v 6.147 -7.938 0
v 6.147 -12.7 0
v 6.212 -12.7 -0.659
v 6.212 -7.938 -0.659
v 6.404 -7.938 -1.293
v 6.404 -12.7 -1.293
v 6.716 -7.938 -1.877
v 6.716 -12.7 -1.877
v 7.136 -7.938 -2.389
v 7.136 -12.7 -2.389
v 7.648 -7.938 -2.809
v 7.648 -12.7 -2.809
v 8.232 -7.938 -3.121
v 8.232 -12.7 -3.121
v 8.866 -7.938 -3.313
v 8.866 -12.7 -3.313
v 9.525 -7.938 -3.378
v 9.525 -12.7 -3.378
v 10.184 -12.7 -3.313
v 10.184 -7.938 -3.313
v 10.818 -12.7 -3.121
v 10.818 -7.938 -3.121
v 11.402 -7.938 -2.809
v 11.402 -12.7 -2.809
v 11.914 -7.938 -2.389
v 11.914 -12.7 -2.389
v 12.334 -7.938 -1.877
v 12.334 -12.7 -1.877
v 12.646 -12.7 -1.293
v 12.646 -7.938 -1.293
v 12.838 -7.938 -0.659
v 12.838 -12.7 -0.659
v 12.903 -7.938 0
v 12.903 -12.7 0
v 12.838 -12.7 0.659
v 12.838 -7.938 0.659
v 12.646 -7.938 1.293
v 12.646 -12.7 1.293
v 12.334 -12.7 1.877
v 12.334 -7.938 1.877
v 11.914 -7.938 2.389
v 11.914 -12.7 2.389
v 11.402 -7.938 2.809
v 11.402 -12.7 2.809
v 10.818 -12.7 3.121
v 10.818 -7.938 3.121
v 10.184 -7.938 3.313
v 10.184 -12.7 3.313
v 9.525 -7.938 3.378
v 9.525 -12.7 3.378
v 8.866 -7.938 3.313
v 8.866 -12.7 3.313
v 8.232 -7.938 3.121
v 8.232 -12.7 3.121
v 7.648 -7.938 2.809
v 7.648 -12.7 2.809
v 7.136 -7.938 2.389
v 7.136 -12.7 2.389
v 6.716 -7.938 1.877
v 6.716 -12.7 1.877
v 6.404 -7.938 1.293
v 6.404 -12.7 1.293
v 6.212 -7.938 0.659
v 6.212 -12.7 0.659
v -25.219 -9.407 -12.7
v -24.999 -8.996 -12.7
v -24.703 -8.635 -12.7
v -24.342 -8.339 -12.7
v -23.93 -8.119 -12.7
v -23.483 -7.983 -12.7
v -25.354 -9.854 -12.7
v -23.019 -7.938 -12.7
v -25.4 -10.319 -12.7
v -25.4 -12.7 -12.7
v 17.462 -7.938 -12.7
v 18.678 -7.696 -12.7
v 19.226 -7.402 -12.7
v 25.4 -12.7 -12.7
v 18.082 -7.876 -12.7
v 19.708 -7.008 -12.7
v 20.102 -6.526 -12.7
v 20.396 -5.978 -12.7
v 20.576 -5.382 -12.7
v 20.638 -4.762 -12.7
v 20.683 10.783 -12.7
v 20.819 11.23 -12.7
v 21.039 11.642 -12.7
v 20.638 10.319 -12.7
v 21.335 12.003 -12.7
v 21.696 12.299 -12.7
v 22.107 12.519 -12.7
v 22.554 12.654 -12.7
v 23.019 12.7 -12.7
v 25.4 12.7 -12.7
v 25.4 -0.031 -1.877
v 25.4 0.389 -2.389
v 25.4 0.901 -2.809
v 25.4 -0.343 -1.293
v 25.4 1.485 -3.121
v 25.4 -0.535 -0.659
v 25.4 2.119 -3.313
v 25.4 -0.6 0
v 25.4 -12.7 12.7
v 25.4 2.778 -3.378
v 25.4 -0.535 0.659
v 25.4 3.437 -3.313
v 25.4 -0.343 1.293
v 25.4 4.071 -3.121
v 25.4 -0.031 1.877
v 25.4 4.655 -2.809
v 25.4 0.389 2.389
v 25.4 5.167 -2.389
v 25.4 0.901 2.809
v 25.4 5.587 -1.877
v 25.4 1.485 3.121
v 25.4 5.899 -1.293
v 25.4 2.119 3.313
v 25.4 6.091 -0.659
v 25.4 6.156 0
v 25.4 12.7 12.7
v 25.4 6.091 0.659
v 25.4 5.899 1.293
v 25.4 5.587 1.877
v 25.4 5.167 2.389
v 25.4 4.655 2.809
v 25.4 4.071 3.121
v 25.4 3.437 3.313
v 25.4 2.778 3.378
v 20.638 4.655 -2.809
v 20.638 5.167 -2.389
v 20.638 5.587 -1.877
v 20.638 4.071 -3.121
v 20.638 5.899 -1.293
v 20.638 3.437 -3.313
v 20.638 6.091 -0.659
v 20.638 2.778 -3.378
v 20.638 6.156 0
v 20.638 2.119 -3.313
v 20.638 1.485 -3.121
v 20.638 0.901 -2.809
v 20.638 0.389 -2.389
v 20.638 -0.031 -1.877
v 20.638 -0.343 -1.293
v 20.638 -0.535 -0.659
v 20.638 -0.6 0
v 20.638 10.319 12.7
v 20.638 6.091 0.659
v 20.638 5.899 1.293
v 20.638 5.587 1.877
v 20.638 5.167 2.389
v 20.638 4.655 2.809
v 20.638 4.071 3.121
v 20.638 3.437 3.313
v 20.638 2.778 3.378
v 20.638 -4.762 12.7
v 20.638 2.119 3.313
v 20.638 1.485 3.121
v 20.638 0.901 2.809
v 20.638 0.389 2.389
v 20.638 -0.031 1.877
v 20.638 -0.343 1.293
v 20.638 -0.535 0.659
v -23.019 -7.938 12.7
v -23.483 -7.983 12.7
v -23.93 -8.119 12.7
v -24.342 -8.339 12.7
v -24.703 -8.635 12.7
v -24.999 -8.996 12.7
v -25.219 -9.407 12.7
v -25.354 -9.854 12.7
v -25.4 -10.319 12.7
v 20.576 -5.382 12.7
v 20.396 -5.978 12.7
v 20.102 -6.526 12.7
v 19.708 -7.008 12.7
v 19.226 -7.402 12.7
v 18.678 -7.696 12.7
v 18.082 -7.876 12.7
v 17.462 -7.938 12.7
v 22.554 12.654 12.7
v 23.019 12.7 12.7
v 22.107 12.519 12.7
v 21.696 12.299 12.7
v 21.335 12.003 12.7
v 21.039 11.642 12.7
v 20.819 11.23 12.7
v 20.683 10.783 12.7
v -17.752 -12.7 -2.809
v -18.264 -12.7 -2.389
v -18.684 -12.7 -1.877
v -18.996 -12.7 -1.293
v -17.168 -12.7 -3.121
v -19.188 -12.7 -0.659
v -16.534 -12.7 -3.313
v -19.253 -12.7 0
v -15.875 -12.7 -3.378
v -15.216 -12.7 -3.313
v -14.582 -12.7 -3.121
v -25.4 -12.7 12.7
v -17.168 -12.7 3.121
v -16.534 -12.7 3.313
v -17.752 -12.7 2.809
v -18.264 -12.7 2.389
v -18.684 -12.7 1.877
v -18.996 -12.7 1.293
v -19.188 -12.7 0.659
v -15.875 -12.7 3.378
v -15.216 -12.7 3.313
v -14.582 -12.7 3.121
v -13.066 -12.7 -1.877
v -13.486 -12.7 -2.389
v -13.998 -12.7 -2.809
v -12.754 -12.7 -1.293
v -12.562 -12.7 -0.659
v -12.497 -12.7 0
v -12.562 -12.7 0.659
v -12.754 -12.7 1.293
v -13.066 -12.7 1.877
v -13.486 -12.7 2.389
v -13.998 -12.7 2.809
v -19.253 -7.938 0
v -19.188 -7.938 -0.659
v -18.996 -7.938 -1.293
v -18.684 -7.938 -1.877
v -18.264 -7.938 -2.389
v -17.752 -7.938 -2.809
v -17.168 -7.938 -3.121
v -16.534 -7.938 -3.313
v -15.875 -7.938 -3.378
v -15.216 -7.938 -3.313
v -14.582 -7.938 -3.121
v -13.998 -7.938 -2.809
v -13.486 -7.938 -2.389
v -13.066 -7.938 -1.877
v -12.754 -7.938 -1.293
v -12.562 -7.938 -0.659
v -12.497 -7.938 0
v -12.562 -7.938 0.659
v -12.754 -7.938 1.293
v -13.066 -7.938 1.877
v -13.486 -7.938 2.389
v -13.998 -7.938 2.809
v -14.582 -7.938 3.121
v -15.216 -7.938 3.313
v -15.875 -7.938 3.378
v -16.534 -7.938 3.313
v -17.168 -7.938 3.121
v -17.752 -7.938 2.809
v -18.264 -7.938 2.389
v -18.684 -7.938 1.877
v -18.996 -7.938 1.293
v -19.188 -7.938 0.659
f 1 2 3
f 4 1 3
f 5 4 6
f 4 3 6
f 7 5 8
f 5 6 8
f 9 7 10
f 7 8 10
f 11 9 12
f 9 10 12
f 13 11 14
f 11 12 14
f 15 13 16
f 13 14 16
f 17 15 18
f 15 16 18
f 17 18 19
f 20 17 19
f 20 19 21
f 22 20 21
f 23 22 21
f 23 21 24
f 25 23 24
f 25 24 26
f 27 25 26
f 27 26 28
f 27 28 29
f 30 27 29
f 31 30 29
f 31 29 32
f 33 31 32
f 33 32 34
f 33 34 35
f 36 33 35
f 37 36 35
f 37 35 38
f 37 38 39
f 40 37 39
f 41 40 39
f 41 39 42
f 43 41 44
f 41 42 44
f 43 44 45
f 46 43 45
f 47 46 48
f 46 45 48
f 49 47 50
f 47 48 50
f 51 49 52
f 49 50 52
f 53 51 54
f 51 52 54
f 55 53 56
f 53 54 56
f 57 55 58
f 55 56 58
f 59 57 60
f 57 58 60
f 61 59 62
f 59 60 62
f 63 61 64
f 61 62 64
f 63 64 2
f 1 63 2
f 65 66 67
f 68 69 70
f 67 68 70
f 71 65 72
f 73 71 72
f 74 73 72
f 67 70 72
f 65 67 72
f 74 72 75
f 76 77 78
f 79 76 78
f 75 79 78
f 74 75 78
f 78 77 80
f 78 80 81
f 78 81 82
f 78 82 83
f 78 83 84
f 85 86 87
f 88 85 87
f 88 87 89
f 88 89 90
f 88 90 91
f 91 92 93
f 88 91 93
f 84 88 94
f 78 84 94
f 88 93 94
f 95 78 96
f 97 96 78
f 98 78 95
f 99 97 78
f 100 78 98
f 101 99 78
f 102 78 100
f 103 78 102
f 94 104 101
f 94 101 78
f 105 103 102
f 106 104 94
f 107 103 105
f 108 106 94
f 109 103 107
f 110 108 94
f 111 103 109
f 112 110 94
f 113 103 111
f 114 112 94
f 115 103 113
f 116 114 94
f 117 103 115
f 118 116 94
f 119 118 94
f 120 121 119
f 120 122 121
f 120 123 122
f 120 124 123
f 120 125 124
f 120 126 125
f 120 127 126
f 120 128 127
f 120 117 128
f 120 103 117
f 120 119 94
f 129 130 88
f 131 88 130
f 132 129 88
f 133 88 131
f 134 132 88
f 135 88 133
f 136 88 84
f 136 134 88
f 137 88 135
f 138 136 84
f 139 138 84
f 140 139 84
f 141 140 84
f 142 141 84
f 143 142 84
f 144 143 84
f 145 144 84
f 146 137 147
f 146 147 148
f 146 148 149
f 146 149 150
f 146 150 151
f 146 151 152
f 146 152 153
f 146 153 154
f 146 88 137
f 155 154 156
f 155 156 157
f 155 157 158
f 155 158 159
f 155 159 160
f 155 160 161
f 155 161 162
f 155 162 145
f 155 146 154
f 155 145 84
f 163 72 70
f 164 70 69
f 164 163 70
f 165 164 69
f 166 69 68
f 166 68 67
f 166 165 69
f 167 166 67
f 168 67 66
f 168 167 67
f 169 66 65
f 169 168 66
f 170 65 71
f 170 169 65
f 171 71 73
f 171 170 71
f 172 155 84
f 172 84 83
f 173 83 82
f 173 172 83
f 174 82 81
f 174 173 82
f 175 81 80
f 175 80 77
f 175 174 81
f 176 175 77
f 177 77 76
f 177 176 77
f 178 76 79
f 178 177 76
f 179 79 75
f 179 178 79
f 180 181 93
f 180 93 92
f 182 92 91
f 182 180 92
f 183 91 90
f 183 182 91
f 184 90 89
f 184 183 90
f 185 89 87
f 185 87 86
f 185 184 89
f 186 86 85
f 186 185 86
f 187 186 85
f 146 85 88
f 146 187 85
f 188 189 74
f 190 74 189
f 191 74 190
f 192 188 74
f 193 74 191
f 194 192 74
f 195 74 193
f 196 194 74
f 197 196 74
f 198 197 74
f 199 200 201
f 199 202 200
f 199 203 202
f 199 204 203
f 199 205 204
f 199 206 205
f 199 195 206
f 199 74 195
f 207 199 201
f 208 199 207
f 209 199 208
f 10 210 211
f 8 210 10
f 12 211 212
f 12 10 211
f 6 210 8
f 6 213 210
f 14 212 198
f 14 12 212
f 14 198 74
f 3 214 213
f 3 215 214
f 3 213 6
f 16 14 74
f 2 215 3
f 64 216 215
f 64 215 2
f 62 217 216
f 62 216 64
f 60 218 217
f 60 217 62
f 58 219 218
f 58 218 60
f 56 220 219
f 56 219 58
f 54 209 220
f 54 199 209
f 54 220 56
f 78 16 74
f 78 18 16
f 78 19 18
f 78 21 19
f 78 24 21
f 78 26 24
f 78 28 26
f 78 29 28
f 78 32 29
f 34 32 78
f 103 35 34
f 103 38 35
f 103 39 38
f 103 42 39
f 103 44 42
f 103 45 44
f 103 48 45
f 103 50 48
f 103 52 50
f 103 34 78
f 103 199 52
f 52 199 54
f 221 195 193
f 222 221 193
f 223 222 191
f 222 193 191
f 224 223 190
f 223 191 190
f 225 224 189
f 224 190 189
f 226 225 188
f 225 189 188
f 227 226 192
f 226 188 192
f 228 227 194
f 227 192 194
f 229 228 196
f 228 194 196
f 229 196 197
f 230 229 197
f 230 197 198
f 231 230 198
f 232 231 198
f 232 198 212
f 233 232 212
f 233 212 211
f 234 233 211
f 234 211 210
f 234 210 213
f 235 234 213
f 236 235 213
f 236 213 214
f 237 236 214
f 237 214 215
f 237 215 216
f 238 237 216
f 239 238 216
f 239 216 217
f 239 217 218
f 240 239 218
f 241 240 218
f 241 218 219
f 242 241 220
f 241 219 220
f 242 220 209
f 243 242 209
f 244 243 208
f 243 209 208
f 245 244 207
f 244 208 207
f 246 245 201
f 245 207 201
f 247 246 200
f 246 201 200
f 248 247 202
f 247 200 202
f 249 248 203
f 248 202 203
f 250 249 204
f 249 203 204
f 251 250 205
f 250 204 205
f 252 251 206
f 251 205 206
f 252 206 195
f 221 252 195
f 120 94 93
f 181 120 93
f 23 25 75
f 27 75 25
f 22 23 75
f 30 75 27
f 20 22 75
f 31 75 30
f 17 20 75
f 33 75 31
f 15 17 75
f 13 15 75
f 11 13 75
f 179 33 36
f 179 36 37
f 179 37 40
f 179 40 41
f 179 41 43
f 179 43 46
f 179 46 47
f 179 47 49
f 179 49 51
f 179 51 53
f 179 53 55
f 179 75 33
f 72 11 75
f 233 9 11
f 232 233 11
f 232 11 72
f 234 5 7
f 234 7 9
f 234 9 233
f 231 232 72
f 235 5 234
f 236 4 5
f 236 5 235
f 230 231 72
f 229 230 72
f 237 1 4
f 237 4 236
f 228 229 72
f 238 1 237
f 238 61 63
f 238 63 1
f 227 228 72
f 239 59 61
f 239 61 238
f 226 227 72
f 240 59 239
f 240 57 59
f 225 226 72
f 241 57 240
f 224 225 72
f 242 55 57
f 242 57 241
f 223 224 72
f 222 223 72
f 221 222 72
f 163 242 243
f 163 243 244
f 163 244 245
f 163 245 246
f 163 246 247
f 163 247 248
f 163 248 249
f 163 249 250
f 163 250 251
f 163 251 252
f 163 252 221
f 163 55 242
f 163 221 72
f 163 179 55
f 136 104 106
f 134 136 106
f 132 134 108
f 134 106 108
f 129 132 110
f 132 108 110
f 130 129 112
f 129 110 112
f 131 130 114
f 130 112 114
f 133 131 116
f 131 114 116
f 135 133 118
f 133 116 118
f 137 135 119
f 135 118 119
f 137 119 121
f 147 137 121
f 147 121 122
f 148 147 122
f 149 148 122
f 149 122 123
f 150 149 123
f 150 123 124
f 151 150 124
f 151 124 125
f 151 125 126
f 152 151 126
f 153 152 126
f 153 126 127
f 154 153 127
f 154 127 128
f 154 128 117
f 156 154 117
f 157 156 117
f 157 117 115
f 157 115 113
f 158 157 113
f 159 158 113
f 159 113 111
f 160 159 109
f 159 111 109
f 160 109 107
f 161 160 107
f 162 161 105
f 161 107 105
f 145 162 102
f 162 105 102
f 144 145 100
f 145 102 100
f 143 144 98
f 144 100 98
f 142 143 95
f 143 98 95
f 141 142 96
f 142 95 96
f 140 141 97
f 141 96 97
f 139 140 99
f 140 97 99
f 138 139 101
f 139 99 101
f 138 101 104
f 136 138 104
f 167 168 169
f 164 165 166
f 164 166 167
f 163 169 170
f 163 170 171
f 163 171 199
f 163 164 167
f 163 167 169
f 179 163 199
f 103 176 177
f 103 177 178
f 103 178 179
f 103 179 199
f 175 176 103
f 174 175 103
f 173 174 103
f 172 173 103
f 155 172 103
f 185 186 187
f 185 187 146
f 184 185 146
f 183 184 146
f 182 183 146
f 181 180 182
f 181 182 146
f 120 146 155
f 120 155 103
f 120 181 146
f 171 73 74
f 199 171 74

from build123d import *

# Parameters (mm, degrees)
BOSS_EXTRUDE1_DEPTH     = 12.7
F_1_4_CLEARANCE_HOLE1_D = 6.7564
F_1_4_CLEARANCE_HOLE2_D = 6.7564


with BuildPart() as part:
    # Sketch2 → Boss-Extrude1 (new, symmetric)
    with BuildSketch(Plane.XY):
        with BuildLine():
            Line((-25.4, -12.7), (25.4, -12.7))
            Line((25.4, -12.7), (25.4, 12.7))
            Line((25.4, 12.7), (23.01875, 12.7))
            ThreePointArc((23.01875, 12.7), (21.334951977, 12.002548023), (20.6375, 10.31875))
            Line((20.6375, 10.31875), (20.6375, -4.7625))
            ThreePointArc((20.6375, -4.7625), (19.70756403, -7.00756403), (17.4625, -7.9375))
            Line((17.4625, -7.9375), (-23.01875, -7.9375))
            ThreePointArc((-23.01875, -7.9375), (-24.702548023, -8.634951977), (-25.4, -10.31875))
            Line((-25.4, -10.31875), (-25.4, -12.7))
        make_face()
    extrude(amount=BOSS_EXTRUDE1_DEPTH, both=True)

    # 1/4 Clearance Hole1 (through all)
    with Locations(Plane.ZY.offset(-20.6375)):
        with Locations((0, 2.778125)):
            Hole(F_1_4_CLEARANCE_HOLE1_D / 2)

    # 1/4 Clearance Hole2 (through all)
    with Locations(Plane(origin=(0, -7.9375, 0), x_dir=(1, 0, 0), z_dir=(0, 1, 0))):
        with Locations((9.525, 0), (-15.875, 0)):
            Hole(F_1_4_CLEARANCE_HOLE2_D / 2)


solid = part.part
